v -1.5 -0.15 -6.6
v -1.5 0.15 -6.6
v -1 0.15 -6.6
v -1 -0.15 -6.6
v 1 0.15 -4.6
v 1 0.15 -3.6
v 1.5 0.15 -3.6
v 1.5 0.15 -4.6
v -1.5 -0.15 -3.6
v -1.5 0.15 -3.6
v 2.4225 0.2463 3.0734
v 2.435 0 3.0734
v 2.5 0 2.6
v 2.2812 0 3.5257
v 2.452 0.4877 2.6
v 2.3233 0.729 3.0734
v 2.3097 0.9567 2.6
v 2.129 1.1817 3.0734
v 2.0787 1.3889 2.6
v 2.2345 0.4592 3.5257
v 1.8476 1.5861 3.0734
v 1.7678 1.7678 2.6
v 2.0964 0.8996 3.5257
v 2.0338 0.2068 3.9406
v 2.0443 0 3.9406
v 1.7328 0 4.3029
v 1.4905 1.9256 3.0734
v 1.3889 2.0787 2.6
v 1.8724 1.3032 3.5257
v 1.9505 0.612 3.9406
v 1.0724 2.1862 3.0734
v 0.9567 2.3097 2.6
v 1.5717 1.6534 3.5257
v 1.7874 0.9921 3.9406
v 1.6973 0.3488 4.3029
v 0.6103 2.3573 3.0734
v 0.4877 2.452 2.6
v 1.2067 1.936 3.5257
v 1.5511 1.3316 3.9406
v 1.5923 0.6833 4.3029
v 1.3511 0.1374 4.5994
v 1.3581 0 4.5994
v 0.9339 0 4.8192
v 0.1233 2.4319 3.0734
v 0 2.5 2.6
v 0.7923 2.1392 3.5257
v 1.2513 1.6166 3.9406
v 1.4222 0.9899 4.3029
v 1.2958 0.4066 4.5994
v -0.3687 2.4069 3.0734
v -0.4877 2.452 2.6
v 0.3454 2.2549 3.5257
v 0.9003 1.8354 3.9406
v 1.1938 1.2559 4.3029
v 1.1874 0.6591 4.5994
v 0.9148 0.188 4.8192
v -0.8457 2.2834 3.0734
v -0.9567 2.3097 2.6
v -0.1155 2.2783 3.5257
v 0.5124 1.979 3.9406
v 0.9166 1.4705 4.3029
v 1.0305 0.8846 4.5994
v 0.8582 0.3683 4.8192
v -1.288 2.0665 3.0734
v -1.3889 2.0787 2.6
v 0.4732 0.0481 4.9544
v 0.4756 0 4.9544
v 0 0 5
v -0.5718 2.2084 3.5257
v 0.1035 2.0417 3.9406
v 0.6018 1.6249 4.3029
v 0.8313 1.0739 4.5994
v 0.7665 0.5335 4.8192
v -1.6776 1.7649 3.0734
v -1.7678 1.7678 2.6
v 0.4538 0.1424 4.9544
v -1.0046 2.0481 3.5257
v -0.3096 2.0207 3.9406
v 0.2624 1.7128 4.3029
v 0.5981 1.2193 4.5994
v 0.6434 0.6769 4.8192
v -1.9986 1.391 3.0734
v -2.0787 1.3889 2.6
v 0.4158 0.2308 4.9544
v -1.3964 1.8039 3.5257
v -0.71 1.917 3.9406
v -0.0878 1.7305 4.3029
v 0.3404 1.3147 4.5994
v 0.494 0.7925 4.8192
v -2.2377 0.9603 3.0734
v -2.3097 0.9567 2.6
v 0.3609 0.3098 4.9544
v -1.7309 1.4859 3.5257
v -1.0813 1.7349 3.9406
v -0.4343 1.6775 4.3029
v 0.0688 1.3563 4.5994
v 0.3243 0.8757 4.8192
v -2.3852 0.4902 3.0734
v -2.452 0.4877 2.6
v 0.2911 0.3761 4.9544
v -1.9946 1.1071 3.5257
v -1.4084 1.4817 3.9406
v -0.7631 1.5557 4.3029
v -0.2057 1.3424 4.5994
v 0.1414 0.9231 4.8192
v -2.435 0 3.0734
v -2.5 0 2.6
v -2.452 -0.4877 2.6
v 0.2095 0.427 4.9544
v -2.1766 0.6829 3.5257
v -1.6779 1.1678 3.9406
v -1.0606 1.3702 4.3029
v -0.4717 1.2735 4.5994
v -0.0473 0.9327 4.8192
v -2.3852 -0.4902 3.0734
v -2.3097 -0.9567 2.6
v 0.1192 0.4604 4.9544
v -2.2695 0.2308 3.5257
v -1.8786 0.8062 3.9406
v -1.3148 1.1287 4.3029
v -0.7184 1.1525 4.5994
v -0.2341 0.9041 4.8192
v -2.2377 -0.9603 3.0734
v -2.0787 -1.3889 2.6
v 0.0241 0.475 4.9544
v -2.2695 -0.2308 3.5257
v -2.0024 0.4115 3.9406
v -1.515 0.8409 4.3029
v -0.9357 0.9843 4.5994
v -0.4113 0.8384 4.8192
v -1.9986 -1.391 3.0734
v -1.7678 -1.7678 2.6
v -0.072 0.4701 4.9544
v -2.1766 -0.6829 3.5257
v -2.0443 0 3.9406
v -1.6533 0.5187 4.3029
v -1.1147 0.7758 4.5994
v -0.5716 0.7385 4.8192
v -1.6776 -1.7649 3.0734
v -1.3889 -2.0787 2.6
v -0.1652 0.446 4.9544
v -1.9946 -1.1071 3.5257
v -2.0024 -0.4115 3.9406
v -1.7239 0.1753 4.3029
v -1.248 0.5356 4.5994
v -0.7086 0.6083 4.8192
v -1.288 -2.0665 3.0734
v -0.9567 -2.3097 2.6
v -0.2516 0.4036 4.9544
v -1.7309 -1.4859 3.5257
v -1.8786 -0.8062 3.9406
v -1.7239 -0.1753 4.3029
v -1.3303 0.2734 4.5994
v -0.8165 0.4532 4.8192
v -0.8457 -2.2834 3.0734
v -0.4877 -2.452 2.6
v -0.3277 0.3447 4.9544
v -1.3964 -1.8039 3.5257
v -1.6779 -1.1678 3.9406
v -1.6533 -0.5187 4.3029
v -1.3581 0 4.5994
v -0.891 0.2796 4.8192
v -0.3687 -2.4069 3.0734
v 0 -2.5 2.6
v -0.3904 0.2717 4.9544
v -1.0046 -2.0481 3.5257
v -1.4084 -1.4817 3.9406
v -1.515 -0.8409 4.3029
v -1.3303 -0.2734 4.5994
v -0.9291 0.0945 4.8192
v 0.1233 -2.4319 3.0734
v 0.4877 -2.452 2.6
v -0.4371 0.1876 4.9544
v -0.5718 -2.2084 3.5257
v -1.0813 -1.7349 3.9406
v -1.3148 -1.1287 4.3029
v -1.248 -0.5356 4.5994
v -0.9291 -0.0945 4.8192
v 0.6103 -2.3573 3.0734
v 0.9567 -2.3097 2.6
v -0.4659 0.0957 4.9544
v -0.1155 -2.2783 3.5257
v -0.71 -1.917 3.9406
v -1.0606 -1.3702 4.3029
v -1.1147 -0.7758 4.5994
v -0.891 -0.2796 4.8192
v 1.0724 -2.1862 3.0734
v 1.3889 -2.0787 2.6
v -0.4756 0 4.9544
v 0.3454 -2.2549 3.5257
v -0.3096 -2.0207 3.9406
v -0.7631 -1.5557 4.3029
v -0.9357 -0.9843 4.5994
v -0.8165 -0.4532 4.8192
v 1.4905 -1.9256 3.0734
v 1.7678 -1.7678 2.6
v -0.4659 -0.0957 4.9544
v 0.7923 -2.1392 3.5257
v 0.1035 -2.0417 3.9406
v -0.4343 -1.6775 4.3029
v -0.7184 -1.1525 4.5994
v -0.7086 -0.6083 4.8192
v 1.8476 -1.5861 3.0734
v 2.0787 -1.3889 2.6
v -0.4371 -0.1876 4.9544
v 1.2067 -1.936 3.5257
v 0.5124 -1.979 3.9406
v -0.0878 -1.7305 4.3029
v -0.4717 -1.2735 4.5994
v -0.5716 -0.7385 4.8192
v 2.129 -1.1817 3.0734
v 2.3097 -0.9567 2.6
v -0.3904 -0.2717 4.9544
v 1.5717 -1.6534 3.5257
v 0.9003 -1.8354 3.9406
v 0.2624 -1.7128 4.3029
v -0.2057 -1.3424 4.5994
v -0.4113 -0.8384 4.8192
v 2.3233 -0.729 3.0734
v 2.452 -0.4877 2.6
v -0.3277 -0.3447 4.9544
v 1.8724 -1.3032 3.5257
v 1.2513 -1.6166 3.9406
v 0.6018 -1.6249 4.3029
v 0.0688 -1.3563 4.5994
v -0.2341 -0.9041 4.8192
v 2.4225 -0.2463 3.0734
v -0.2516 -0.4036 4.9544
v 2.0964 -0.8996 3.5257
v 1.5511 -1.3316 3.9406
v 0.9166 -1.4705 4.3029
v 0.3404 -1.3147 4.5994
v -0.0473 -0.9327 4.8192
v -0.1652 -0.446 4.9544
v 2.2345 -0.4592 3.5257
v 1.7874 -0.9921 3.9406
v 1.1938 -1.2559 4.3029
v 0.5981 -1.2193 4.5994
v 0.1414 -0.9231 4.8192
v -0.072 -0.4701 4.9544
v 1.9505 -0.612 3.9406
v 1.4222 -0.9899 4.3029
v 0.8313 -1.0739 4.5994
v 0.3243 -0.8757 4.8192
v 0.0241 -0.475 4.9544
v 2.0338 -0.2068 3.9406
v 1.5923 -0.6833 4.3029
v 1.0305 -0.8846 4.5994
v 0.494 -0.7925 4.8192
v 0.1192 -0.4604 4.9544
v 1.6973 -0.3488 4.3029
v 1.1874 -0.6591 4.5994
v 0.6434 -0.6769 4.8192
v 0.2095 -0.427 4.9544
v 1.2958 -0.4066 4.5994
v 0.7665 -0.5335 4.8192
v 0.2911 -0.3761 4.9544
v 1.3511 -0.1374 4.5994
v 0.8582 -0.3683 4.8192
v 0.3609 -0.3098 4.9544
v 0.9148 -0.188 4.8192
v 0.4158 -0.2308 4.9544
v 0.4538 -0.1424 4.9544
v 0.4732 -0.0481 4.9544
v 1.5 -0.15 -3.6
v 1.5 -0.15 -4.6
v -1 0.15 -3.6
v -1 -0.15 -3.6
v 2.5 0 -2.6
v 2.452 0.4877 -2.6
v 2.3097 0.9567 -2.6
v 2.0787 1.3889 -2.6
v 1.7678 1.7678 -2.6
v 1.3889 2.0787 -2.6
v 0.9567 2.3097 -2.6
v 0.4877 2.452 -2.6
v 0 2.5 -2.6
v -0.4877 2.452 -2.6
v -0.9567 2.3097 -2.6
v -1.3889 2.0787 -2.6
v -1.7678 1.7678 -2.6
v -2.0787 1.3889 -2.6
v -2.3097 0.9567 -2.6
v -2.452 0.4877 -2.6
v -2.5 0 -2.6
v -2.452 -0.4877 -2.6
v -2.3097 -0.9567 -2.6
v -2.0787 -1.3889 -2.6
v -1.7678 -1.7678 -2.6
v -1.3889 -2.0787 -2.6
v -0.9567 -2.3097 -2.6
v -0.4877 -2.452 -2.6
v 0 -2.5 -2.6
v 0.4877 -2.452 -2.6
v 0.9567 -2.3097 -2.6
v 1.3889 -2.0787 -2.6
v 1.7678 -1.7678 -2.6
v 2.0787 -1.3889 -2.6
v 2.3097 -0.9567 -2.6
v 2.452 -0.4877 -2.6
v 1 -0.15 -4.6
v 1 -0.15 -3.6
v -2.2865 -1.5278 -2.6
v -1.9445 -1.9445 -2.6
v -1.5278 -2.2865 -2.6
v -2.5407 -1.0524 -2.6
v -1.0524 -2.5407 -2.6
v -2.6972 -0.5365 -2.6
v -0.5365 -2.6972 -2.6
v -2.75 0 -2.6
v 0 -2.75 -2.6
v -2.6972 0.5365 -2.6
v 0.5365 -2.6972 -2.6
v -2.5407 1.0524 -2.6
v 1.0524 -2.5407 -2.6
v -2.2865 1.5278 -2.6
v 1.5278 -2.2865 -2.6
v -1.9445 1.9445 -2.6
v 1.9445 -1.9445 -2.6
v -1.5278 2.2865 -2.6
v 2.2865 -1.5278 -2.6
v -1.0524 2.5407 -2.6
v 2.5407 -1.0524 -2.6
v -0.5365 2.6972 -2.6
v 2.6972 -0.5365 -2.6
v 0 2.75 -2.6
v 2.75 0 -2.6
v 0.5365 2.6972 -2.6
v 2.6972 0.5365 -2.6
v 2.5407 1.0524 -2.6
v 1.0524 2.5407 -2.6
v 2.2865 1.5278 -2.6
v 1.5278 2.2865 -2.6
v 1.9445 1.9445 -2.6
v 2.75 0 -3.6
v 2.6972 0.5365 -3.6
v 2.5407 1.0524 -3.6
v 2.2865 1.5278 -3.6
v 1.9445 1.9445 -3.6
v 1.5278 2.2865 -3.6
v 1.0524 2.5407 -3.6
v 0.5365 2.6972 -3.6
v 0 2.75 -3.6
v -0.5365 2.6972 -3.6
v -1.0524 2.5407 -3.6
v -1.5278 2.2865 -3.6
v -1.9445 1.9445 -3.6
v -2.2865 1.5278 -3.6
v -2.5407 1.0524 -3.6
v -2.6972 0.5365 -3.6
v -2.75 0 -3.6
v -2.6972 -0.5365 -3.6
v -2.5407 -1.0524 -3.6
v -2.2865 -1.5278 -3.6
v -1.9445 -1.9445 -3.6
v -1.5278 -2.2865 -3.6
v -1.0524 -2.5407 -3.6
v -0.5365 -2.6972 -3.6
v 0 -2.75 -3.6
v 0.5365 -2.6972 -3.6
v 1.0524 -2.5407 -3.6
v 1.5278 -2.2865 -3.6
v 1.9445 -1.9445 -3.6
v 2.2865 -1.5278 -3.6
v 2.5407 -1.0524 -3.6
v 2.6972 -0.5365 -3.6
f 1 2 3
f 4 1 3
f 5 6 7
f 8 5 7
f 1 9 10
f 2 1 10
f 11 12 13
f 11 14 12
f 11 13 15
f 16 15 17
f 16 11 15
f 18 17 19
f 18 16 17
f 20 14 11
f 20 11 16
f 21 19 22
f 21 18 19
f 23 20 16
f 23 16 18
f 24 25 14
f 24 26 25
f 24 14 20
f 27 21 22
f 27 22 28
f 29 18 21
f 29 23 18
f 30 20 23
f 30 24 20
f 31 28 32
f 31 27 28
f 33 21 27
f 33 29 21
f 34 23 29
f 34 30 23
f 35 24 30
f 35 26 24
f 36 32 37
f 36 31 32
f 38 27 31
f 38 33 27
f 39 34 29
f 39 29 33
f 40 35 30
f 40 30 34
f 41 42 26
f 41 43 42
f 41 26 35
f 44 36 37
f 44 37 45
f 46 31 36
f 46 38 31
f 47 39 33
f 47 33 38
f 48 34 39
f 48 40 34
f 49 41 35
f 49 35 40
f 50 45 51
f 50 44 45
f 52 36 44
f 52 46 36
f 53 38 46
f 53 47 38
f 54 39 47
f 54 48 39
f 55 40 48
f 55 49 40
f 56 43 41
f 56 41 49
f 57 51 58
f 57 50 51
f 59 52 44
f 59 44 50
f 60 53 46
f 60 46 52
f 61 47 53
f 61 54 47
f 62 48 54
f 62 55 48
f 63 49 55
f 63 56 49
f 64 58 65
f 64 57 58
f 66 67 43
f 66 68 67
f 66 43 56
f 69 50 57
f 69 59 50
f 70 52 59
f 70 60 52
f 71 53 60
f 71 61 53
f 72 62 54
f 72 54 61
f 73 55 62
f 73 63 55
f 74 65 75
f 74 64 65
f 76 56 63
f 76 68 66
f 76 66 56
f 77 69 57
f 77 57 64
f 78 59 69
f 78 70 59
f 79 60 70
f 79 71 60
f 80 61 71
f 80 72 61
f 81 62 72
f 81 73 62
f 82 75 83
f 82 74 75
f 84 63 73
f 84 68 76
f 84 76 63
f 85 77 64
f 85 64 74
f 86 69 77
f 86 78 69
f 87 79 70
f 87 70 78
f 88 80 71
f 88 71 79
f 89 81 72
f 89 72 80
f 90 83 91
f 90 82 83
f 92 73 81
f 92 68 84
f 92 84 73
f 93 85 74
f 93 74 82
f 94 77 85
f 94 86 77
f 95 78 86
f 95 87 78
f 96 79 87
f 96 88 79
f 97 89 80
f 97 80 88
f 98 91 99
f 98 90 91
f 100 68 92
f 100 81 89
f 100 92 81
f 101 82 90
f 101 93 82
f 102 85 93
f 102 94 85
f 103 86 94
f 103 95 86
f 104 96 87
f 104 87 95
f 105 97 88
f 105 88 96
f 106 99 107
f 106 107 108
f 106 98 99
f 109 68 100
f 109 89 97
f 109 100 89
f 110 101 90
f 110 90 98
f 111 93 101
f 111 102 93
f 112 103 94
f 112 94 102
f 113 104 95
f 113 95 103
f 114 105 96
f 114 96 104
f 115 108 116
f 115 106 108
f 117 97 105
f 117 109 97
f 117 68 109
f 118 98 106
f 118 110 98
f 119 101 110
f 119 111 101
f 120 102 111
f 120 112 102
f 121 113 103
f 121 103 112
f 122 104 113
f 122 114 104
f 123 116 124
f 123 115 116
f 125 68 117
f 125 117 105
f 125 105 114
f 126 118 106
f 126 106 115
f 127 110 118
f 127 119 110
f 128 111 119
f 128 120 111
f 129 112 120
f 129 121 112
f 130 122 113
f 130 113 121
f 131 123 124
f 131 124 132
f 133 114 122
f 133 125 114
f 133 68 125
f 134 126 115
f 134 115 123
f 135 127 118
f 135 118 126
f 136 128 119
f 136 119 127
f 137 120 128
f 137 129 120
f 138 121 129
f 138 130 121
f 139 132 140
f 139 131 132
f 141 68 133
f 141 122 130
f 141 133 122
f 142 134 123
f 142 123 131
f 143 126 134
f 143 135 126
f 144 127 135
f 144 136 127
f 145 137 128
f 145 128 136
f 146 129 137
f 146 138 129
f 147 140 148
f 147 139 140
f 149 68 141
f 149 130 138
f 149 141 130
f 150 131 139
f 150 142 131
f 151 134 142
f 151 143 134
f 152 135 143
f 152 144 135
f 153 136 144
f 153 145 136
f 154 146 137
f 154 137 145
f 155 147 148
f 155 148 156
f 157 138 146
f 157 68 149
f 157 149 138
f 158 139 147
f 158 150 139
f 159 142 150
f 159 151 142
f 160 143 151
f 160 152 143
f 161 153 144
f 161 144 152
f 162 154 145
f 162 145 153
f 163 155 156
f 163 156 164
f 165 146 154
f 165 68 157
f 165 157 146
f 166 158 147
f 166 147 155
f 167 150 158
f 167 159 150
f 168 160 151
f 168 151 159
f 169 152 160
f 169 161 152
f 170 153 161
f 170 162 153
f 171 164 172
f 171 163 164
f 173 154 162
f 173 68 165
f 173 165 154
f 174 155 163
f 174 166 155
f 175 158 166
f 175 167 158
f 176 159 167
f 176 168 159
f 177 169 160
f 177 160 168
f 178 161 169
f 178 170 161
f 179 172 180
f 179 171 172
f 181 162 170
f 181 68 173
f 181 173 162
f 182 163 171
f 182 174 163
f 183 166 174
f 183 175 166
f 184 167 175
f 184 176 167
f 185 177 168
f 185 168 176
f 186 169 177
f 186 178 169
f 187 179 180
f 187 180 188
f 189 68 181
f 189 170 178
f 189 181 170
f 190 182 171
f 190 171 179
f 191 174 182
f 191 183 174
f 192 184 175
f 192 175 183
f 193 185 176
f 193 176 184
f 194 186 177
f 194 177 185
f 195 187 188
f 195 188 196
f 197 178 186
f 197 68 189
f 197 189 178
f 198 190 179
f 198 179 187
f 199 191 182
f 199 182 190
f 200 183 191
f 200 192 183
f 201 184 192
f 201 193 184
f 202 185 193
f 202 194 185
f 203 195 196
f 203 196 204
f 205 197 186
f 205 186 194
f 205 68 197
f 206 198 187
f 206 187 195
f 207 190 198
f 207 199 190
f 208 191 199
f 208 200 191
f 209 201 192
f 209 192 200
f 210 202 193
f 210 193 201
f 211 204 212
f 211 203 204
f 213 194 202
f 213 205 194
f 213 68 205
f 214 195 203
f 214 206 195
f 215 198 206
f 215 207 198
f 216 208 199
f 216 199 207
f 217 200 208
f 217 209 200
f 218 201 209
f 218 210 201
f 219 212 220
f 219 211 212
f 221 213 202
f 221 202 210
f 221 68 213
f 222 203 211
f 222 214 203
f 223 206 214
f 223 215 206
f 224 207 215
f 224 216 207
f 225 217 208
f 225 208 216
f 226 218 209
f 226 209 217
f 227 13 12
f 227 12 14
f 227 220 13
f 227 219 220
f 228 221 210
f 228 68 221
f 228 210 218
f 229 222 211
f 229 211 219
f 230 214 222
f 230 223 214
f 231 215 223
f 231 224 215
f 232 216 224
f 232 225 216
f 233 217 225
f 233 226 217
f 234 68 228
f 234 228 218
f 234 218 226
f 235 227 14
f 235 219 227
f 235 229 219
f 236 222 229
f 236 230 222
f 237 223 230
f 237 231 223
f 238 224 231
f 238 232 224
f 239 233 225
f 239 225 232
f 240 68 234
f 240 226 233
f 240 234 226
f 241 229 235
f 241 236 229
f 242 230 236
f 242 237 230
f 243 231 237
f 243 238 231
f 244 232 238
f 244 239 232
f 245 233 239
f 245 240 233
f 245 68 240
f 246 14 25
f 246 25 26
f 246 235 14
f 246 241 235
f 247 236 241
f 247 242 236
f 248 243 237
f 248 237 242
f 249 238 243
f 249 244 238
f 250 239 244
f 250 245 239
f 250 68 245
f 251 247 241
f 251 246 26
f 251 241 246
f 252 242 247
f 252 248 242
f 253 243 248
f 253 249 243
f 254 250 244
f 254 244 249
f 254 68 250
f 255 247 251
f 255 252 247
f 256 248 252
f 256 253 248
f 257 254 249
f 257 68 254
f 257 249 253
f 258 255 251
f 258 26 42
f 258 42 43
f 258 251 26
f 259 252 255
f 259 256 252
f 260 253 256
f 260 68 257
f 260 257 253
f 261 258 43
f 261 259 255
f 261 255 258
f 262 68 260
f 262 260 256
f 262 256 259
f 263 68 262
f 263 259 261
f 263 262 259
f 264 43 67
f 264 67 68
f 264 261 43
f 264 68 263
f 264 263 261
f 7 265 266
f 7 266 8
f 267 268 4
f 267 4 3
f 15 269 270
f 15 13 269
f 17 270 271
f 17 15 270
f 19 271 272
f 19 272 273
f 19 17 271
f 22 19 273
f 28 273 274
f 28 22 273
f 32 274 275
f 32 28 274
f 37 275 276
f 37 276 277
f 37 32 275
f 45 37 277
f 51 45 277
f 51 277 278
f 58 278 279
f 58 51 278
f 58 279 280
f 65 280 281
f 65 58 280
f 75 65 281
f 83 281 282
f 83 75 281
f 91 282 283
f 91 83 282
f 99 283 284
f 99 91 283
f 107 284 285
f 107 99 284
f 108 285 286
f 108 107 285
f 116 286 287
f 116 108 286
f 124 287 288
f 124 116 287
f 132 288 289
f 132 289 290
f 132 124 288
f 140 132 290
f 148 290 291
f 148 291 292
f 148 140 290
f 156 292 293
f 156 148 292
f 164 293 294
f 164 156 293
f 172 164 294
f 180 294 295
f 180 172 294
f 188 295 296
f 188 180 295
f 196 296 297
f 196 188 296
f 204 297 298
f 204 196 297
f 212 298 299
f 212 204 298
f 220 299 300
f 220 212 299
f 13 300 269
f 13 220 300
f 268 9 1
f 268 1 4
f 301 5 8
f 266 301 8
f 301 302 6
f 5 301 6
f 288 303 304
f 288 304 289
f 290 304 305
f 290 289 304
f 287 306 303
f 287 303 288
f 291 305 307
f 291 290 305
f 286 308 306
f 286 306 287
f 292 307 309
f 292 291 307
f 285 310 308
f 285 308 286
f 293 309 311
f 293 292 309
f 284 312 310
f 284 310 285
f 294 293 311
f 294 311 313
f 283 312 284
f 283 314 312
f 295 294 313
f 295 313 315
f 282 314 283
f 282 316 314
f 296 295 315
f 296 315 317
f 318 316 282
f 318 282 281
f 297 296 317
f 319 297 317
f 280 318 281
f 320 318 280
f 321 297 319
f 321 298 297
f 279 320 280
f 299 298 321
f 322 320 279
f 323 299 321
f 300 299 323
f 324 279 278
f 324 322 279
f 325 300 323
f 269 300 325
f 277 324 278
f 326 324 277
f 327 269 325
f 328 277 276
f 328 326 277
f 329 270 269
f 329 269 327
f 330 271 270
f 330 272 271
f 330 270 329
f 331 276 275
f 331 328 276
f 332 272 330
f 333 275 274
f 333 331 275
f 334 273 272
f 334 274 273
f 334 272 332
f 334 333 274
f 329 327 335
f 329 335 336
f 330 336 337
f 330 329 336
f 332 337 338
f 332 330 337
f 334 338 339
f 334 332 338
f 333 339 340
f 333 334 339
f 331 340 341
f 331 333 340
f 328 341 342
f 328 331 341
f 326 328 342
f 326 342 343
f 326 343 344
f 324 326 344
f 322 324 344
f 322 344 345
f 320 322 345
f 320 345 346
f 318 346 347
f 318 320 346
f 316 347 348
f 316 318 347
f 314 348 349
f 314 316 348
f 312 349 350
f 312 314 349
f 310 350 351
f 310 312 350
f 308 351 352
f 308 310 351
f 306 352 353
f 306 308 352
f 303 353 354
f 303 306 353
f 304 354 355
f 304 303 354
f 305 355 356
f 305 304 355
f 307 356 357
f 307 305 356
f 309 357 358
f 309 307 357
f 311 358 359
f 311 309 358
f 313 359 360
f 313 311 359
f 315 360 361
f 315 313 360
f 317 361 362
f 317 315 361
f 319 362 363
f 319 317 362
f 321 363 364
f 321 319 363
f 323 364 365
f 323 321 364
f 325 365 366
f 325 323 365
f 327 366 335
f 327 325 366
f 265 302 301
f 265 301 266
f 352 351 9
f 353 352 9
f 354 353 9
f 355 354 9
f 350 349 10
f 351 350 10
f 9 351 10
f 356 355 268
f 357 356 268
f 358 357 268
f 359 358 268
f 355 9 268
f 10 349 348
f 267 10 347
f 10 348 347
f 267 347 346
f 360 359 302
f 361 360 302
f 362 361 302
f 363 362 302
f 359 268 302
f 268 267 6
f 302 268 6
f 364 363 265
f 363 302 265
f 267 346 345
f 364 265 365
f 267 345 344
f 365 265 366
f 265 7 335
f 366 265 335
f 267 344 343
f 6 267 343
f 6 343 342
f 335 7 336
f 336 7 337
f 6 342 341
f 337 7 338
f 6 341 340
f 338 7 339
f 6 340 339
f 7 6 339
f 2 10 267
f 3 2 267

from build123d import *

# Parameters (mm, degrees)
SKETCH1_R           = 2.5
BOSS_EXTRUDE1_DEPTH = 2.6
BOSS_EXTRUDE2_START = -2.6
SKETCH2_R           = 2.75
BOSS_EXTRUDE2_DEPTH = 1
DOME1_FACE_RADIUS   = 2.5
DOME1_HEIGHT        = 2.4
BOSS_EXTRUDE3_START = -3.6
SKETCH3_W           = 0.5
SKETCH3_H           = 0.3
BOSS_EXTRUDE3_DEPTH = 3
CUT_EXTRUDE1_START  = -6.6
SKETCH4_W           = 0.5
SKETCH4_H           = 0.3
CUT_EXTRUDE1_DEPTH  = 2


with BuildPart() as part:
    # Sketch1 → Boss-Extrude1 (new, symmetric)
    with BuildSketch(Plane.XY):
        Circle(SKETCH1_R)
    extrude(amount=BOSS_EXTRUDE1_DEPTH, both=True)

    # Sketch2 → Boss-Extrude2 (add)
    with BuildSketch(Plane.XY.offset(BOSS_EXTRUDE2_START)):
        Circle(SKETCH2_R)
    extrude(amount=-BOSS_EXTRUDE2_DEPTH)

    # Dome1: a dome of height H over a round flat face of radius A is a cap of a sphere of radius (A * A + H * H) / (2 * H)
    dome1_r = (DOME1_FACE_RADIUS * DOME1_FACE_RADIUS + DOME1_HEIGHT * DOME1_HEIGHT) / (2 * DOME1_HEIGHT)
    dome1_base = Plane((0, 0, 2.6), z_dir=(0, 0, 1))
    with Locations(dome1_base.offset(DOME1_HEIGHT - dome1_r)):
        dome1_ball = Sphere(dome1_r, mode=Mode.PRIVATE)
    add(split(dome1_ball, bisect_by=dome1_base, keep=Keep.TOP, mode=Mode.PRIVATE))

    # Sketch3 → Boss-Extrude3 (add)
    with BuildSketch(Plane.XY.offset(BOSS_EXTRUDE3_START)):
        with Locations((1.25, 0)):
            Rectangle(SKETCH3_W, SKETCH3_H)
        with Locations((-1.25, 0)):
            Rectangle(SKETCH3_W, SKETCH3_H)
    extrude(amount=-BOSS_EXTRUDE3_DEPTH)

    # Sketch4 → Cut-Extrude1 (cut)
    with BuildSketch(Plane.XY.offset(CUT_EXTRUDE1_START)):
        with Locations((1.25, 0)):
            Rectangle(SKETCH4_W, SKETCH4_H)
    extrude(amount=CUT_EXTRUDE1_DEPTH, mode=Mode.SUBTRACT)


solid = part.part
